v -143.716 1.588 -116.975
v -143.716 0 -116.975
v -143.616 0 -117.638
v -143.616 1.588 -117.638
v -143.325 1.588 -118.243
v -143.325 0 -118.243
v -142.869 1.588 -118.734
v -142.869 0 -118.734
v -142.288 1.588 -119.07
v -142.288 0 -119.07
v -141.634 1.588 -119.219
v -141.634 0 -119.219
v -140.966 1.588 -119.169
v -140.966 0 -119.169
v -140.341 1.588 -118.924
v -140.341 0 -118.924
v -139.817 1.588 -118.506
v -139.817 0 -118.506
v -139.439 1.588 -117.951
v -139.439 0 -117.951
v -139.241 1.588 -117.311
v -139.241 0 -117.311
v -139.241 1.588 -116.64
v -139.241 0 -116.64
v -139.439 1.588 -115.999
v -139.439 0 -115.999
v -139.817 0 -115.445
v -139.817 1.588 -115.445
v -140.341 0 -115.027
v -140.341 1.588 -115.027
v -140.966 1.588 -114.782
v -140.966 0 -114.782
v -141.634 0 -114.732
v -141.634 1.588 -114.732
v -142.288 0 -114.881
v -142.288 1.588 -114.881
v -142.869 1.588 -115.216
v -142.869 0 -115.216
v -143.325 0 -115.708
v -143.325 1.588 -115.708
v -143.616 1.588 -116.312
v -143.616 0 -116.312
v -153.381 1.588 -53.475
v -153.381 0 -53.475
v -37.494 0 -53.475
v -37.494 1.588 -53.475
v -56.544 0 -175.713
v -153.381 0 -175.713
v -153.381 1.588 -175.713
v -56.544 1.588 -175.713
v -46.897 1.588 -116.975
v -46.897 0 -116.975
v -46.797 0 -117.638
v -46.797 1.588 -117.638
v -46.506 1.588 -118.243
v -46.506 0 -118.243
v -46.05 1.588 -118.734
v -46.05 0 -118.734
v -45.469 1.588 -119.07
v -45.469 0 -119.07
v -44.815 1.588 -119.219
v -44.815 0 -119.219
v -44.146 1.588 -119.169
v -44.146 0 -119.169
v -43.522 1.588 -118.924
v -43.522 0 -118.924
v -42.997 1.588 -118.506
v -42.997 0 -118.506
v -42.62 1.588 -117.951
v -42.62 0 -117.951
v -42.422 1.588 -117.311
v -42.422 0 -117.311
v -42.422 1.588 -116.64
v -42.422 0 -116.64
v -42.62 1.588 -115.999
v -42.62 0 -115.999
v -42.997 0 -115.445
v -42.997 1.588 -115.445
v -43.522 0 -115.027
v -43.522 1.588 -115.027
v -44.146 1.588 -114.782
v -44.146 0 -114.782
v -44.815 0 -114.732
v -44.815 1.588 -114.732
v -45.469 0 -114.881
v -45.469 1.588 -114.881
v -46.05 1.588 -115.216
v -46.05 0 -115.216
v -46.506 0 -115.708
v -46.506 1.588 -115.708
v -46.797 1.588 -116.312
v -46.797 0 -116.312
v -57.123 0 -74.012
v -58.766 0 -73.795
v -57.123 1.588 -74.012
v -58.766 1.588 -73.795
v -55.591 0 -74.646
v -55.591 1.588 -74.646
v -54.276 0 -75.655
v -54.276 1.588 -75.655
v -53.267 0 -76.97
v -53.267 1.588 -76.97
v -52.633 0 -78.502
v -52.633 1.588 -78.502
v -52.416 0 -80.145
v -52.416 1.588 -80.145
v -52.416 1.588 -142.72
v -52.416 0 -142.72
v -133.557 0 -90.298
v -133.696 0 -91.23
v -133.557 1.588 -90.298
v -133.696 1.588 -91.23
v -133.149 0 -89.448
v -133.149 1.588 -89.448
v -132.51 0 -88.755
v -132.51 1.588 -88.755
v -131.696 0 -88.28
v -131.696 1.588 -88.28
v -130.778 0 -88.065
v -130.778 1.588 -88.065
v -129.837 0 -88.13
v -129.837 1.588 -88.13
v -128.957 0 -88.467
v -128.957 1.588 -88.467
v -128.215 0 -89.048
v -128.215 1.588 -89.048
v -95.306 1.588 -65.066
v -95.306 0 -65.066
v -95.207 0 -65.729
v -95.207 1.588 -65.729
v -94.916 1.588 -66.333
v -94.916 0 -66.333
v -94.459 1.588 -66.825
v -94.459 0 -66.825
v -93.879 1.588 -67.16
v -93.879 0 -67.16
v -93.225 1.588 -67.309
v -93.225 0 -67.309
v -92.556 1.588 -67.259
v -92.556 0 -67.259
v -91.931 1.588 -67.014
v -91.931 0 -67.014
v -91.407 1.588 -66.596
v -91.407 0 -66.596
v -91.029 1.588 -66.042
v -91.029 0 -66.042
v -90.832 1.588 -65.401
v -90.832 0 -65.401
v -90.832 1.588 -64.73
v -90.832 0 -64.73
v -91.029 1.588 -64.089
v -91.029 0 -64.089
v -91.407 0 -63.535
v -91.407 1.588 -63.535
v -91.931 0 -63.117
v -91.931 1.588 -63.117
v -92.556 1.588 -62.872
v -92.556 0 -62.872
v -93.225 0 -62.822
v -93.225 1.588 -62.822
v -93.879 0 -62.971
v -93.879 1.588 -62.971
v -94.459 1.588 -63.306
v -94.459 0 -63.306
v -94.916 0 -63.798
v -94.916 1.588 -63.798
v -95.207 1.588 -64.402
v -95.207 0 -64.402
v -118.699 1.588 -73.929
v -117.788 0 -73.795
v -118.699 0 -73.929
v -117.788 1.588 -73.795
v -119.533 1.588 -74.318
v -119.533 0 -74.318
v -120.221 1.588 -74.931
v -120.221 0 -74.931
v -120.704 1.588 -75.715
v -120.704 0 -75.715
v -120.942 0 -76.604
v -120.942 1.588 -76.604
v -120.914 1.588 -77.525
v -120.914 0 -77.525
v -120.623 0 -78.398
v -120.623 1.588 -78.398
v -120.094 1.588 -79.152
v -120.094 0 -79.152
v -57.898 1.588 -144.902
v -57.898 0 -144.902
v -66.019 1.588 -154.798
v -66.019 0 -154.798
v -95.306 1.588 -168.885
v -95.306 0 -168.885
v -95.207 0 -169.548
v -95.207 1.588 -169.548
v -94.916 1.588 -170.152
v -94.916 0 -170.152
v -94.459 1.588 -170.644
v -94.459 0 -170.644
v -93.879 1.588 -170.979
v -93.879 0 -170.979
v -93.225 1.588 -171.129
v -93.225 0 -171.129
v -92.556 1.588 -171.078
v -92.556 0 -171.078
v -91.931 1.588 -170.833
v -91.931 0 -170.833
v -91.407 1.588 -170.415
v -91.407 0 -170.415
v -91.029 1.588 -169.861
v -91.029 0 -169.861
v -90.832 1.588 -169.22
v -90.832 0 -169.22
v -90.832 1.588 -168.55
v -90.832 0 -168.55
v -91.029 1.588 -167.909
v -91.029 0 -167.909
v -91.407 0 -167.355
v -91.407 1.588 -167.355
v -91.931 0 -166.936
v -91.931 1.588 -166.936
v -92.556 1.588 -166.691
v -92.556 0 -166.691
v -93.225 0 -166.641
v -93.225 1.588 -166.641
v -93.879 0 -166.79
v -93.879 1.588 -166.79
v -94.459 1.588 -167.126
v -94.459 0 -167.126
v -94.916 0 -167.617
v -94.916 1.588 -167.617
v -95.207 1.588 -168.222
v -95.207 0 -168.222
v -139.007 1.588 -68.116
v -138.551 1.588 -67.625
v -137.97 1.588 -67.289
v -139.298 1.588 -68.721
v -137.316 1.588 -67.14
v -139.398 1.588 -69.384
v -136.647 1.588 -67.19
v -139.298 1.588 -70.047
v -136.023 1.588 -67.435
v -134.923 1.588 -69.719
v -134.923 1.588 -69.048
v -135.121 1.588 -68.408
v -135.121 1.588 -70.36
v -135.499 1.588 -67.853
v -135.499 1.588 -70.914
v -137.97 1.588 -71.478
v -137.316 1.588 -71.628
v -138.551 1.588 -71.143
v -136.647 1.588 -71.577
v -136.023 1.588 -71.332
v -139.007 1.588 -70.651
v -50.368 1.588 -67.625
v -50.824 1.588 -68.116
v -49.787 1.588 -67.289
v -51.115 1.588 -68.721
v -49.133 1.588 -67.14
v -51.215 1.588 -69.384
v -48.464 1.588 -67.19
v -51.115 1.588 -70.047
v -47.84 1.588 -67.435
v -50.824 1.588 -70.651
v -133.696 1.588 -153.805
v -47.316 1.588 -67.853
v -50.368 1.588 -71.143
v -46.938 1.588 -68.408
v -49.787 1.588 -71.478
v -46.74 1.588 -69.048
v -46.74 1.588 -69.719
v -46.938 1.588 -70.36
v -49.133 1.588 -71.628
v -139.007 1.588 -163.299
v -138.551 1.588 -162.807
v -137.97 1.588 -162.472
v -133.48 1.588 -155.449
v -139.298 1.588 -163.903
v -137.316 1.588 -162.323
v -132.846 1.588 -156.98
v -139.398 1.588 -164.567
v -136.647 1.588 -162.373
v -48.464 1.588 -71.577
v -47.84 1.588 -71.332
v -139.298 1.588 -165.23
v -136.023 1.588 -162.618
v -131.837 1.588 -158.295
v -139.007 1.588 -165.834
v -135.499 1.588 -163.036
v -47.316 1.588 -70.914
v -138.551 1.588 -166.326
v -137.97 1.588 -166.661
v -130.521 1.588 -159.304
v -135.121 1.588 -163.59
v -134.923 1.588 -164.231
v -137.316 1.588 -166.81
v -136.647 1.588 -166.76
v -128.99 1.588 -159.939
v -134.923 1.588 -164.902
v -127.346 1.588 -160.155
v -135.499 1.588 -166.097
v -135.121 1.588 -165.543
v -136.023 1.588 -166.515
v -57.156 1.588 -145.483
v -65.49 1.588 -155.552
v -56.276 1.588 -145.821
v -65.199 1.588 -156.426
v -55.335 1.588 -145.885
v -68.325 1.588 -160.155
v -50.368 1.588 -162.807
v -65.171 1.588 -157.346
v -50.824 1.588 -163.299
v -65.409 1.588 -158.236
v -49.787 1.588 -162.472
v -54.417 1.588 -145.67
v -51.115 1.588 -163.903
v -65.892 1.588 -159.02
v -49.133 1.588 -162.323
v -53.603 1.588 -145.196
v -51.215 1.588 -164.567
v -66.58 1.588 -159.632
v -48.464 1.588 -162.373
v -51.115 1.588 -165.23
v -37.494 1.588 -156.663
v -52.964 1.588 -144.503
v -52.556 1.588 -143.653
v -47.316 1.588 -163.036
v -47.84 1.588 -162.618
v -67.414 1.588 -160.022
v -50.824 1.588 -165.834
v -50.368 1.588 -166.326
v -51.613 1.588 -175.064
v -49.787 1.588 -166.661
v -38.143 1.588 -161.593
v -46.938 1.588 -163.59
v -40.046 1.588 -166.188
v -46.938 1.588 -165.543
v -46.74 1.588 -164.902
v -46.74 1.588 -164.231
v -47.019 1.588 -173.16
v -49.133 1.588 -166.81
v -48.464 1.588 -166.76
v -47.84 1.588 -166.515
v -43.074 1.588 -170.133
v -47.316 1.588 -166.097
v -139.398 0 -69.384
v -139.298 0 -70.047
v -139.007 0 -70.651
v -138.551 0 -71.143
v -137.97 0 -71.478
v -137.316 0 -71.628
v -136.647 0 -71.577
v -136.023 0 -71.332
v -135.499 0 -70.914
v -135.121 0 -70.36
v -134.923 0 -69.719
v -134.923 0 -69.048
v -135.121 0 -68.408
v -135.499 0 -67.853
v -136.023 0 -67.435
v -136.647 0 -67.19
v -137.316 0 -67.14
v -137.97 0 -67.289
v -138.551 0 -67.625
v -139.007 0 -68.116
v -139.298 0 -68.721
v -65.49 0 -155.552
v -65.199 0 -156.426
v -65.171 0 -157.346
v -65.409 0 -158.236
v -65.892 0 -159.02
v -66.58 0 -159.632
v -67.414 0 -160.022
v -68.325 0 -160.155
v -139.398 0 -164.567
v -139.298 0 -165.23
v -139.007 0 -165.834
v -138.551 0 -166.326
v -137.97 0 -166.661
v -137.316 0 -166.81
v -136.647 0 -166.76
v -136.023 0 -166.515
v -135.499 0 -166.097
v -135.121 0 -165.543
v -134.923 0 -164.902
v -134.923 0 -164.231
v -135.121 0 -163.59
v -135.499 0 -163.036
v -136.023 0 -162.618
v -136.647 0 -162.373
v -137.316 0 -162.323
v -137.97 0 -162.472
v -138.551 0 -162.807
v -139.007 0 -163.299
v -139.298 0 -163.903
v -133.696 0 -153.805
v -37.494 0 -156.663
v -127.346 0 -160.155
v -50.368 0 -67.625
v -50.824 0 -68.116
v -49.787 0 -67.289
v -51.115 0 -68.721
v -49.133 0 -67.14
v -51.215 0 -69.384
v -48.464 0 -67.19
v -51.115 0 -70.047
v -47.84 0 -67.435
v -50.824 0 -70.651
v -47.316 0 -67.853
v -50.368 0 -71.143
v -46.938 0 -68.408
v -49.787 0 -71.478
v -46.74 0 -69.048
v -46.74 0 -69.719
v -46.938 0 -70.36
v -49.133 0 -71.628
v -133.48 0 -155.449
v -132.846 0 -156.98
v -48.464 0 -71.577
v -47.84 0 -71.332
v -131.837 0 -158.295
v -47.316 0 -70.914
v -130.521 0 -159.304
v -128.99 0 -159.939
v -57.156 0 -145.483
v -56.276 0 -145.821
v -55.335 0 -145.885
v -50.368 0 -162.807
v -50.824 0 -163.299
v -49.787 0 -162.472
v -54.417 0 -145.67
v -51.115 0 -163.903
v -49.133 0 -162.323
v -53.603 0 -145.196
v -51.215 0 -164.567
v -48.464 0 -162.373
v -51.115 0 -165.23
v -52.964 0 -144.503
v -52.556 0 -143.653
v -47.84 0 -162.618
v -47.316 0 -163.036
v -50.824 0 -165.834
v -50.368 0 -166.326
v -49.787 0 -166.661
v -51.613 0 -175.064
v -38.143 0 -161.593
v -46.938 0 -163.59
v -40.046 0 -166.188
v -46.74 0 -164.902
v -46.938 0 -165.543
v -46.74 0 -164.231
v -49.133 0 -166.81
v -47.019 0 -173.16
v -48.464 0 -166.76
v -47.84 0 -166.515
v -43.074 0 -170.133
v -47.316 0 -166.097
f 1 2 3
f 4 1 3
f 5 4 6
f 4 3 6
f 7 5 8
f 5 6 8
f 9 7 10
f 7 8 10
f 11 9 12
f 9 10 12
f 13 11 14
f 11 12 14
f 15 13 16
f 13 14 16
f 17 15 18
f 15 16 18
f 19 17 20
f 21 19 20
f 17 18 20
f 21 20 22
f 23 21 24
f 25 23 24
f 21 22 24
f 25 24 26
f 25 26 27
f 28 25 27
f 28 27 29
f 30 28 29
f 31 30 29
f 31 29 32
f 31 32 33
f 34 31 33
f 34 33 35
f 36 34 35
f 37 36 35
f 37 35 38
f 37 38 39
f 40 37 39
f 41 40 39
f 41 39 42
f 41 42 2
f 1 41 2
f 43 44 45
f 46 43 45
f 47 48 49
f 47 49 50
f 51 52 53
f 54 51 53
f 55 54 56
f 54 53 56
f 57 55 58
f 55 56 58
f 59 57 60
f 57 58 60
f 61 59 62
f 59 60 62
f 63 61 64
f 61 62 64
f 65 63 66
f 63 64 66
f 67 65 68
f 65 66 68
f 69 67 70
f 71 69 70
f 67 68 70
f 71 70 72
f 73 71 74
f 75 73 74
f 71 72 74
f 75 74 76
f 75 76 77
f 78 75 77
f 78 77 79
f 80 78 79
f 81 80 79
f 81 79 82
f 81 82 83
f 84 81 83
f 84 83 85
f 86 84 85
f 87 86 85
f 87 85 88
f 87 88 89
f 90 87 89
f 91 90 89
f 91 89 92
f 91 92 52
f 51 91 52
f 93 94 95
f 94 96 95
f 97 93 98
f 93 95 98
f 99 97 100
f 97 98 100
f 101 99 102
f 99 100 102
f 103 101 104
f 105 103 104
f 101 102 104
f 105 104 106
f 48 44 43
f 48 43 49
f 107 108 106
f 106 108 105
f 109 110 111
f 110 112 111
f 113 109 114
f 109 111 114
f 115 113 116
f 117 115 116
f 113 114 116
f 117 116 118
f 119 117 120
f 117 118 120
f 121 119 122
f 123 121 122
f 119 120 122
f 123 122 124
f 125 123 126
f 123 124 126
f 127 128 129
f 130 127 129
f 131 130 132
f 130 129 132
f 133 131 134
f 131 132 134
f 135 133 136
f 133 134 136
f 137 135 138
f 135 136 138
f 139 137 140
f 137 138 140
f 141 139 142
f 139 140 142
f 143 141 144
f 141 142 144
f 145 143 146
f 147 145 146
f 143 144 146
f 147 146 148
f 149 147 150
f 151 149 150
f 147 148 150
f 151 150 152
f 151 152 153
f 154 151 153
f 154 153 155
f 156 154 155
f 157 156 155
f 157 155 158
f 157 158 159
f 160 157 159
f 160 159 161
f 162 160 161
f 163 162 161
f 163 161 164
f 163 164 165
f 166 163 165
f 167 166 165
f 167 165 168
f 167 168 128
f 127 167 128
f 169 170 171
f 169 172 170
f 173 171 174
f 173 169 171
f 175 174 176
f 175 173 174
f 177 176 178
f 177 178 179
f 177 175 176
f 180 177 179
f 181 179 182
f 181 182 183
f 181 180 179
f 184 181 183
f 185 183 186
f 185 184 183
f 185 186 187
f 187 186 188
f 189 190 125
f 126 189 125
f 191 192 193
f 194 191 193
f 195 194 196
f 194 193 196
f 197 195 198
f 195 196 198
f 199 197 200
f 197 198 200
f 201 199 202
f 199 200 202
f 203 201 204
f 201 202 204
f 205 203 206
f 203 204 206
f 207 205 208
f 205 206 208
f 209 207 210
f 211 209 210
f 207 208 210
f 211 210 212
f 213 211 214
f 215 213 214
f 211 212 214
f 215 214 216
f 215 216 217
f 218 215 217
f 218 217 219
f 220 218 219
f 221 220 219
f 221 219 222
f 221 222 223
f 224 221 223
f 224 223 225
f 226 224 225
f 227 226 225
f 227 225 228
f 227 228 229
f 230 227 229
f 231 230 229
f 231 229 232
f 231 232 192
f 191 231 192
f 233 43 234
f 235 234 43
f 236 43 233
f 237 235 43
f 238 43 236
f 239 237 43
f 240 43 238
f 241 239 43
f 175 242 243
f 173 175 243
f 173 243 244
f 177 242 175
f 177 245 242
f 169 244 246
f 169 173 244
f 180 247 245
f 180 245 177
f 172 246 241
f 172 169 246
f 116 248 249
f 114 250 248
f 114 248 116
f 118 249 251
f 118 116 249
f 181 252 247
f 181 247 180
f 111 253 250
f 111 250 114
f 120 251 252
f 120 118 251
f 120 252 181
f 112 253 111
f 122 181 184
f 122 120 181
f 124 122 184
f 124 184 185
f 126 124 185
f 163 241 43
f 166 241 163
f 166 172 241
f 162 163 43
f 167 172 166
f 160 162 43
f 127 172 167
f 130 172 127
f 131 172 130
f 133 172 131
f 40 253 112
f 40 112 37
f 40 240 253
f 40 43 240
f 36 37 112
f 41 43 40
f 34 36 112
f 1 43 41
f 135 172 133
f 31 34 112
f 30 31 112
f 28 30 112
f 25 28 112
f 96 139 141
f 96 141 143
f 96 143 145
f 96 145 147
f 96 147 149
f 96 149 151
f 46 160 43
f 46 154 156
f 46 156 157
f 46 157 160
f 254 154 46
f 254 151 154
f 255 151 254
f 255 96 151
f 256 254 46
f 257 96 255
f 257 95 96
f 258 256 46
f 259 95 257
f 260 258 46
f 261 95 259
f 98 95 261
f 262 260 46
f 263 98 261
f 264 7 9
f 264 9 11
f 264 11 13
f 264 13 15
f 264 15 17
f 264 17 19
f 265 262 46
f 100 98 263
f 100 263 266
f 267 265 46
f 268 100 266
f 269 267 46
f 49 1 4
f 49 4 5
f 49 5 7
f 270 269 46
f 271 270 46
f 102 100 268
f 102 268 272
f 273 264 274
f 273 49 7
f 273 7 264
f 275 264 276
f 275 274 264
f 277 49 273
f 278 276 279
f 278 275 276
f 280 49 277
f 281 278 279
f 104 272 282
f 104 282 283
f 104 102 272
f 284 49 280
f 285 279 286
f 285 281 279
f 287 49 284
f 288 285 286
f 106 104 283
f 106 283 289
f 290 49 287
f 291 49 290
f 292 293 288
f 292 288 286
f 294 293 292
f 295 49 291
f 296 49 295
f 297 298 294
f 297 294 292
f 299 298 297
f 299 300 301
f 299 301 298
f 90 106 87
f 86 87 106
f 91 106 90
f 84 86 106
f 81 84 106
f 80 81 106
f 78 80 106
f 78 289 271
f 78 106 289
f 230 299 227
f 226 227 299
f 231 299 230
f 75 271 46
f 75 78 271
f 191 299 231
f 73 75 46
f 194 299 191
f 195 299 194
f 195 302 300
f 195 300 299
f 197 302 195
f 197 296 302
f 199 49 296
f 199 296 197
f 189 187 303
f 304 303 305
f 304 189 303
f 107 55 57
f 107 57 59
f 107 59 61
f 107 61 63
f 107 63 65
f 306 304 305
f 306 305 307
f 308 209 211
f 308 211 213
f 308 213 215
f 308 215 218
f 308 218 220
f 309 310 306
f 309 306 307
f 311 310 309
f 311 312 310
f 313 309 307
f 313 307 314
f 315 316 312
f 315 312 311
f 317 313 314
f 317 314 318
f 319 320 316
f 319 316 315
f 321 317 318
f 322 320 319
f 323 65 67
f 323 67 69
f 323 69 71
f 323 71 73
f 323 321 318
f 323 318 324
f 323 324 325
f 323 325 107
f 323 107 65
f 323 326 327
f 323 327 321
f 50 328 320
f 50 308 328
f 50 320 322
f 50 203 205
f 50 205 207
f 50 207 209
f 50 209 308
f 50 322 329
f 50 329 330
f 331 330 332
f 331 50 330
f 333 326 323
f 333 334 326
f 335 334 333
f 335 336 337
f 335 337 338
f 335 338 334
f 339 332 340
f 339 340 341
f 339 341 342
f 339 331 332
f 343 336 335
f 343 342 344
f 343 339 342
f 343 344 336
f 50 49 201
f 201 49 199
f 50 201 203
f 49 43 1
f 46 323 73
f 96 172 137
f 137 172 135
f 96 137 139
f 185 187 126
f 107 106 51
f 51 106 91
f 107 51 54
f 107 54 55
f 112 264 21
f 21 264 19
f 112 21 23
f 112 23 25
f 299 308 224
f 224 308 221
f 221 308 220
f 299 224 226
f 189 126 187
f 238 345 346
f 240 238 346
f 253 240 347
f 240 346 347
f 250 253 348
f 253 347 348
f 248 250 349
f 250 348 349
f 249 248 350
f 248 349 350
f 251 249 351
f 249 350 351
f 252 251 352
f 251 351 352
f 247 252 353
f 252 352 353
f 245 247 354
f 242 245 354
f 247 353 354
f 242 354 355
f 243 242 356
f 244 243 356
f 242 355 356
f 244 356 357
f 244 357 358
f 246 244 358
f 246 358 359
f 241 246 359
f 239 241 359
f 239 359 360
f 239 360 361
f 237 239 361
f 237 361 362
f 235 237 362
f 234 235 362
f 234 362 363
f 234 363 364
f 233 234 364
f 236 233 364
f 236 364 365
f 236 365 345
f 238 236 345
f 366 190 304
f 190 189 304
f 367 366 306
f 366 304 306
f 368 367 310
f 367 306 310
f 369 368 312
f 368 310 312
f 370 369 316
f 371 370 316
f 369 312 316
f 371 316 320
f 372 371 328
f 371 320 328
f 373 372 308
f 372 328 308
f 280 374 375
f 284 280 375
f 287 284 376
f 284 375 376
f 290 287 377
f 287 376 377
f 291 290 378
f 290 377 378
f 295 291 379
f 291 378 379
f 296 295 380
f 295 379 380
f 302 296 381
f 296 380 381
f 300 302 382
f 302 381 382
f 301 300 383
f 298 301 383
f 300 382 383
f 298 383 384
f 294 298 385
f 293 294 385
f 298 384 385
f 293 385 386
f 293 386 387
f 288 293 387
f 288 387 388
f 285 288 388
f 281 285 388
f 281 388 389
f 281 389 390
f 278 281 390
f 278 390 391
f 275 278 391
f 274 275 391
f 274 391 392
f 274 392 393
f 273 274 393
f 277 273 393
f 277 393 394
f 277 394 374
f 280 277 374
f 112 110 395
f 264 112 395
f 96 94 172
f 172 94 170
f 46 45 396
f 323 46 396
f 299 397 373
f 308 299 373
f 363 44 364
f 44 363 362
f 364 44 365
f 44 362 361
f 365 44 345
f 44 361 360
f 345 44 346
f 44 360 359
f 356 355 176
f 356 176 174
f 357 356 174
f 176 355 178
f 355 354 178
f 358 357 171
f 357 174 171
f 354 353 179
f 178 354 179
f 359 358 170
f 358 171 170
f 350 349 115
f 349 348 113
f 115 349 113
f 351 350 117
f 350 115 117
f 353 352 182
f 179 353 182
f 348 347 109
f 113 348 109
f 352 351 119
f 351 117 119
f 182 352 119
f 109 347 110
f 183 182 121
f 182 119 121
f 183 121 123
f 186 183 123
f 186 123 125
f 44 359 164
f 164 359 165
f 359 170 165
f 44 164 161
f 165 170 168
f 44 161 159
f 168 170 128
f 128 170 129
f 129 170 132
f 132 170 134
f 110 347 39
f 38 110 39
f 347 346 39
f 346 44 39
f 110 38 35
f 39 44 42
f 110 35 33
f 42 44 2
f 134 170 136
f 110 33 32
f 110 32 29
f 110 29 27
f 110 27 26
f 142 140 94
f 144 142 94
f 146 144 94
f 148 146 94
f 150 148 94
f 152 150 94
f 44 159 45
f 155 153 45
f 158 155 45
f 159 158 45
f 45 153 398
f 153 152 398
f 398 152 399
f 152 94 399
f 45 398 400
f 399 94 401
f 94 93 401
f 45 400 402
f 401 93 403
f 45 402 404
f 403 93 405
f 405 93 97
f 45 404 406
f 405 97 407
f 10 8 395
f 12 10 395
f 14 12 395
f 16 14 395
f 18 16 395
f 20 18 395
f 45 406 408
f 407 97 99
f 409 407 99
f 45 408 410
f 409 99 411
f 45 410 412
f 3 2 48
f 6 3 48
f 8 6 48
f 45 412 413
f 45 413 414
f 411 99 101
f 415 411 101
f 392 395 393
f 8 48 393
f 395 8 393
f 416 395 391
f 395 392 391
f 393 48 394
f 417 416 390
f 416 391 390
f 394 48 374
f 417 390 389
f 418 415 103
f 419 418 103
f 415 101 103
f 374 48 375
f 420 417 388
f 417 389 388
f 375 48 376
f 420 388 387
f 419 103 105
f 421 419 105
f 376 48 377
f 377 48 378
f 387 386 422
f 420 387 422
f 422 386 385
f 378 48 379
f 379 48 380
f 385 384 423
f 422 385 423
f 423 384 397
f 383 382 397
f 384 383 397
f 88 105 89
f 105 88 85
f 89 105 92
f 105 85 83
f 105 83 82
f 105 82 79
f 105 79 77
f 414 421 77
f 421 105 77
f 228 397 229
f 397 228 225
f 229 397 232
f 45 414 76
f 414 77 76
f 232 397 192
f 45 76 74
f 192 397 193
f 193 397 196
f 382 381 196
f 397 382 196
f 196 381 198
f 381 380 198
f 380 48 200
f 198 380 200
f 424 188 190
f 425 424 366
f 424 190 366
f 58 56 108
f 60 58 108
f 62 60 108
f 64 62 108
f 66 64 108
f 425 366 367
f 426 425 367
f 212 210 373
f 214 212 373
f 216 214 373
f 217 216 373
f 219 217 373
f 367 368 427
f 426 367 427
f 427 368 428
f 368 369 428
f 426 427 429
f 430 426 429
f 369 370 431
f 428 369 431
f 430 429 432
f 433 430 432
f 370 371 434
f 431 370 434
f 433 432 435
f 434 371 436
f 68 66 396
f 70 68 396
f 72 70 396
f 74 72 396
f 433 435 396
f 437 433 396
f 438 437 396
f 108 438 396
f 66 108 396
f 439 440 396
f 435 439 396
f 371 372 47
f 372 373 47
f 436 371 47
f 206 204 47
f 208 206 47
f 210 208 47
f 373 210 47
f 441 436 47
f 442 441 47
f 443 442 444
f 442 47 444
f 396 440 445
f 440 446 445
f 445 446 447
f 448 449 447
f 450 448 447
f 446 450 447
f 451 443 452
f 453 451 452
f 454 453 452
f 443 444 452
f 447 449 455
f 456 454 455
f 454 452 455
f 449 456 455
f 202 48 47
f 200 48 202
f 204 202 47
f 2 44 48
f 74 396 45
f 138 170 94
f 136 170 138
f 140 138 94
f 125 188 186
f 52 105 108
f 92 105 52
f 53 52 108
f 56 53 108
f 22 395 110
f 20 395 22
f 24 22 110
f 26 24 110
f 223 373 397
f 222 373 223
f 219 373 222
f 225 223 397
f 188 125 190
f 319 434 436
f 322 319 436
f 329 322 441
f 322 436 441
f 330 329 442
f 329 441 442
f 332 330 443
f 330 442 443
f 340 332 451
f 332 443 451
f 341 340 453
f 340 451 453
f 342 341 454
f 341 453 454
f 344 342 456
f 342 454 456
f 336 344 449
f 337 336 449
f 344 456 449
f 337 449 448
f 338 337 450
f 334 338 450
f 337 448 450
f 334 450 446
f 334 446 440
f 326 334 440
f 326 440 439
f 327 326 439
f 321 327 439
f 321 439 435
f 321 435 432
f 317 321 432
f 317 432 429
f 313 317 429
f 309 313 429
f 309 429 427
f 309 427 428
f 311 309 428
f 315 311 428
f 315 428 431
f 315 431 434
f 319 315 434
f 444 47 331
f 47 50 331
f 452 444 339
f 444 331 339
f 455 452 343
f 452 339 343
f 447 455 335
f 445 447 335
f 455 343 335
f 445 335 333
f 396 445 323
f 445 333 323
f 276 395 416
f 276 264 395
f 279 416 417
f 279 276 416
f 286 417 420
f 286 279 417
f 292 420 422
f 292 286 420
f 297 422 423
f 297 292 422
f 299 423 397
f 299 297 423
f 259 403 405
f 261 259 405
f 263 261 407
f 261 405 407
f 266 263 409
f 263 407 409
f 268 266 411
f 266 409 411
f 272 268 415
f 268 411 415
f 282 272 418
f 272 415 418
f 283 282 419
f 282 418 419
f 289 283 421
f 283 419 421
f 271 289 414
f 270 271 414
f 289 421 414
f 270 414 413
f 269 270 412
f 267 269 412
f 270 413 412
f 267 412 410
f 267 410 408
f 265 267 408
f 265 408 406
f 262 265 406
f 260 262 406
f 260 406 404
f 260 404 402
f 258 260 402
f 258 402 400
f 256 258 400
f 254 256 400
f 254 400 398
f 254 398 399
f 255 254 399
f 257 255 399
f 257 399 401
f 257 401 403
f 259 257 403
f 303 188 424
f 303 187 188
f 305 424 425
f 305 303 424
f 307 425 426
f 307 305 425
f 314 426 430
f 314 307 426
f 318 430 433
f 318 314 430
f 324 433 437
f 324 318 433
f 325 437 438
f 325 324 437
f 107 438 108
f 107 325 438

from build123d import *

# Parameters (mm, degrees)
SKETCH2_W            = 115.8875
SKETCH2_H            = 122.2375
BOSS_EXTRUDE4_DEPTH  = 1.5875
M4_CLEARANCE_HOLE1_D = 4.5
FILLET1_R            = 19.05
FILLET2_R            = 6.35
FILLET3_R            = 3.175


with BuildPart() as part:
    # Sketch2 → Boss-Extrude4 (new body)
    with BuildSketch(Plane(origin=(0, 0, 0), x_dir=(1, 0, 0), z_dir=(0, 1, 0))):
        with Locations((-95.437748261, 114.593960112)):
            Rectangle(SKETCH2_W, SKETCH2_H)
        Polygon((-133.696498261, 160.155210112), (-60.951469128, 160.155210112), (-133.696498261, 83.253322171), align=None, mode=Mode.SUBTRACT)
        Polygon((-52.416498261, 150.697098052), (-52.416498261, 73.795210112), (-125.161527393, 73.795210112), align=None, mode=Mode.SUBTRACT)
    extrude(amount=BOSS_EXTRUDE4_DEPTH)

    # M4 Clearance Hole1 (through all)
    with Locations(Plane(origin=(0, 1.5875, 0), x_dir=(1, 0, 0), z_dir=(0, 1, 0))):
        with Locations((-93.056498261, 65.065510112), (-137.14786851, 69.38383987), (-141.466198251, 116.975210121), (-137.147868492, 164.56658037), (-93.056498242, 168.884910112), (-48.965127993, 164.566580353), (-44.646798251, 116.975210102), (-48.965128011, 69.383839853)):
            Hole(M4_CLEARANCE_HOLE1_D / 2)

    # Fillet1
    fillet1_edges = [part.edges().sort_by_distance(p)[0] for p in [
        (-37.493998261, 0.79375, -175.712710112),
    ]]
    fillet(fillet1_edges, radius=FILLET1_R)

    # Fillet2
    fillet2_edges = [part.edges().sort_by_distance(p)[0] for p in [
        (-133.696498261, 0.79375, -160.155210112),
        (-52.416498261, 0.79375, -73.795210112),
    ]]
    fillet(fillet2_edges, radius=FILLET2_R)

    # Fillet3
    fillet3_edges = [part.edges().sort_by_distance(p)[0] for p in [
        (-133.696498261, 0.79375, -83.253322171),
        (-60.951469128, 0.79375, -160.155210112),
        (-125.161527393, 0.79375, -73.795210112),
        (-52.416498261, 0.79375, -150.697098052),
    ]]
    fillet(fillet3_edges, radius=FILLET3_R)


solid = part.part
